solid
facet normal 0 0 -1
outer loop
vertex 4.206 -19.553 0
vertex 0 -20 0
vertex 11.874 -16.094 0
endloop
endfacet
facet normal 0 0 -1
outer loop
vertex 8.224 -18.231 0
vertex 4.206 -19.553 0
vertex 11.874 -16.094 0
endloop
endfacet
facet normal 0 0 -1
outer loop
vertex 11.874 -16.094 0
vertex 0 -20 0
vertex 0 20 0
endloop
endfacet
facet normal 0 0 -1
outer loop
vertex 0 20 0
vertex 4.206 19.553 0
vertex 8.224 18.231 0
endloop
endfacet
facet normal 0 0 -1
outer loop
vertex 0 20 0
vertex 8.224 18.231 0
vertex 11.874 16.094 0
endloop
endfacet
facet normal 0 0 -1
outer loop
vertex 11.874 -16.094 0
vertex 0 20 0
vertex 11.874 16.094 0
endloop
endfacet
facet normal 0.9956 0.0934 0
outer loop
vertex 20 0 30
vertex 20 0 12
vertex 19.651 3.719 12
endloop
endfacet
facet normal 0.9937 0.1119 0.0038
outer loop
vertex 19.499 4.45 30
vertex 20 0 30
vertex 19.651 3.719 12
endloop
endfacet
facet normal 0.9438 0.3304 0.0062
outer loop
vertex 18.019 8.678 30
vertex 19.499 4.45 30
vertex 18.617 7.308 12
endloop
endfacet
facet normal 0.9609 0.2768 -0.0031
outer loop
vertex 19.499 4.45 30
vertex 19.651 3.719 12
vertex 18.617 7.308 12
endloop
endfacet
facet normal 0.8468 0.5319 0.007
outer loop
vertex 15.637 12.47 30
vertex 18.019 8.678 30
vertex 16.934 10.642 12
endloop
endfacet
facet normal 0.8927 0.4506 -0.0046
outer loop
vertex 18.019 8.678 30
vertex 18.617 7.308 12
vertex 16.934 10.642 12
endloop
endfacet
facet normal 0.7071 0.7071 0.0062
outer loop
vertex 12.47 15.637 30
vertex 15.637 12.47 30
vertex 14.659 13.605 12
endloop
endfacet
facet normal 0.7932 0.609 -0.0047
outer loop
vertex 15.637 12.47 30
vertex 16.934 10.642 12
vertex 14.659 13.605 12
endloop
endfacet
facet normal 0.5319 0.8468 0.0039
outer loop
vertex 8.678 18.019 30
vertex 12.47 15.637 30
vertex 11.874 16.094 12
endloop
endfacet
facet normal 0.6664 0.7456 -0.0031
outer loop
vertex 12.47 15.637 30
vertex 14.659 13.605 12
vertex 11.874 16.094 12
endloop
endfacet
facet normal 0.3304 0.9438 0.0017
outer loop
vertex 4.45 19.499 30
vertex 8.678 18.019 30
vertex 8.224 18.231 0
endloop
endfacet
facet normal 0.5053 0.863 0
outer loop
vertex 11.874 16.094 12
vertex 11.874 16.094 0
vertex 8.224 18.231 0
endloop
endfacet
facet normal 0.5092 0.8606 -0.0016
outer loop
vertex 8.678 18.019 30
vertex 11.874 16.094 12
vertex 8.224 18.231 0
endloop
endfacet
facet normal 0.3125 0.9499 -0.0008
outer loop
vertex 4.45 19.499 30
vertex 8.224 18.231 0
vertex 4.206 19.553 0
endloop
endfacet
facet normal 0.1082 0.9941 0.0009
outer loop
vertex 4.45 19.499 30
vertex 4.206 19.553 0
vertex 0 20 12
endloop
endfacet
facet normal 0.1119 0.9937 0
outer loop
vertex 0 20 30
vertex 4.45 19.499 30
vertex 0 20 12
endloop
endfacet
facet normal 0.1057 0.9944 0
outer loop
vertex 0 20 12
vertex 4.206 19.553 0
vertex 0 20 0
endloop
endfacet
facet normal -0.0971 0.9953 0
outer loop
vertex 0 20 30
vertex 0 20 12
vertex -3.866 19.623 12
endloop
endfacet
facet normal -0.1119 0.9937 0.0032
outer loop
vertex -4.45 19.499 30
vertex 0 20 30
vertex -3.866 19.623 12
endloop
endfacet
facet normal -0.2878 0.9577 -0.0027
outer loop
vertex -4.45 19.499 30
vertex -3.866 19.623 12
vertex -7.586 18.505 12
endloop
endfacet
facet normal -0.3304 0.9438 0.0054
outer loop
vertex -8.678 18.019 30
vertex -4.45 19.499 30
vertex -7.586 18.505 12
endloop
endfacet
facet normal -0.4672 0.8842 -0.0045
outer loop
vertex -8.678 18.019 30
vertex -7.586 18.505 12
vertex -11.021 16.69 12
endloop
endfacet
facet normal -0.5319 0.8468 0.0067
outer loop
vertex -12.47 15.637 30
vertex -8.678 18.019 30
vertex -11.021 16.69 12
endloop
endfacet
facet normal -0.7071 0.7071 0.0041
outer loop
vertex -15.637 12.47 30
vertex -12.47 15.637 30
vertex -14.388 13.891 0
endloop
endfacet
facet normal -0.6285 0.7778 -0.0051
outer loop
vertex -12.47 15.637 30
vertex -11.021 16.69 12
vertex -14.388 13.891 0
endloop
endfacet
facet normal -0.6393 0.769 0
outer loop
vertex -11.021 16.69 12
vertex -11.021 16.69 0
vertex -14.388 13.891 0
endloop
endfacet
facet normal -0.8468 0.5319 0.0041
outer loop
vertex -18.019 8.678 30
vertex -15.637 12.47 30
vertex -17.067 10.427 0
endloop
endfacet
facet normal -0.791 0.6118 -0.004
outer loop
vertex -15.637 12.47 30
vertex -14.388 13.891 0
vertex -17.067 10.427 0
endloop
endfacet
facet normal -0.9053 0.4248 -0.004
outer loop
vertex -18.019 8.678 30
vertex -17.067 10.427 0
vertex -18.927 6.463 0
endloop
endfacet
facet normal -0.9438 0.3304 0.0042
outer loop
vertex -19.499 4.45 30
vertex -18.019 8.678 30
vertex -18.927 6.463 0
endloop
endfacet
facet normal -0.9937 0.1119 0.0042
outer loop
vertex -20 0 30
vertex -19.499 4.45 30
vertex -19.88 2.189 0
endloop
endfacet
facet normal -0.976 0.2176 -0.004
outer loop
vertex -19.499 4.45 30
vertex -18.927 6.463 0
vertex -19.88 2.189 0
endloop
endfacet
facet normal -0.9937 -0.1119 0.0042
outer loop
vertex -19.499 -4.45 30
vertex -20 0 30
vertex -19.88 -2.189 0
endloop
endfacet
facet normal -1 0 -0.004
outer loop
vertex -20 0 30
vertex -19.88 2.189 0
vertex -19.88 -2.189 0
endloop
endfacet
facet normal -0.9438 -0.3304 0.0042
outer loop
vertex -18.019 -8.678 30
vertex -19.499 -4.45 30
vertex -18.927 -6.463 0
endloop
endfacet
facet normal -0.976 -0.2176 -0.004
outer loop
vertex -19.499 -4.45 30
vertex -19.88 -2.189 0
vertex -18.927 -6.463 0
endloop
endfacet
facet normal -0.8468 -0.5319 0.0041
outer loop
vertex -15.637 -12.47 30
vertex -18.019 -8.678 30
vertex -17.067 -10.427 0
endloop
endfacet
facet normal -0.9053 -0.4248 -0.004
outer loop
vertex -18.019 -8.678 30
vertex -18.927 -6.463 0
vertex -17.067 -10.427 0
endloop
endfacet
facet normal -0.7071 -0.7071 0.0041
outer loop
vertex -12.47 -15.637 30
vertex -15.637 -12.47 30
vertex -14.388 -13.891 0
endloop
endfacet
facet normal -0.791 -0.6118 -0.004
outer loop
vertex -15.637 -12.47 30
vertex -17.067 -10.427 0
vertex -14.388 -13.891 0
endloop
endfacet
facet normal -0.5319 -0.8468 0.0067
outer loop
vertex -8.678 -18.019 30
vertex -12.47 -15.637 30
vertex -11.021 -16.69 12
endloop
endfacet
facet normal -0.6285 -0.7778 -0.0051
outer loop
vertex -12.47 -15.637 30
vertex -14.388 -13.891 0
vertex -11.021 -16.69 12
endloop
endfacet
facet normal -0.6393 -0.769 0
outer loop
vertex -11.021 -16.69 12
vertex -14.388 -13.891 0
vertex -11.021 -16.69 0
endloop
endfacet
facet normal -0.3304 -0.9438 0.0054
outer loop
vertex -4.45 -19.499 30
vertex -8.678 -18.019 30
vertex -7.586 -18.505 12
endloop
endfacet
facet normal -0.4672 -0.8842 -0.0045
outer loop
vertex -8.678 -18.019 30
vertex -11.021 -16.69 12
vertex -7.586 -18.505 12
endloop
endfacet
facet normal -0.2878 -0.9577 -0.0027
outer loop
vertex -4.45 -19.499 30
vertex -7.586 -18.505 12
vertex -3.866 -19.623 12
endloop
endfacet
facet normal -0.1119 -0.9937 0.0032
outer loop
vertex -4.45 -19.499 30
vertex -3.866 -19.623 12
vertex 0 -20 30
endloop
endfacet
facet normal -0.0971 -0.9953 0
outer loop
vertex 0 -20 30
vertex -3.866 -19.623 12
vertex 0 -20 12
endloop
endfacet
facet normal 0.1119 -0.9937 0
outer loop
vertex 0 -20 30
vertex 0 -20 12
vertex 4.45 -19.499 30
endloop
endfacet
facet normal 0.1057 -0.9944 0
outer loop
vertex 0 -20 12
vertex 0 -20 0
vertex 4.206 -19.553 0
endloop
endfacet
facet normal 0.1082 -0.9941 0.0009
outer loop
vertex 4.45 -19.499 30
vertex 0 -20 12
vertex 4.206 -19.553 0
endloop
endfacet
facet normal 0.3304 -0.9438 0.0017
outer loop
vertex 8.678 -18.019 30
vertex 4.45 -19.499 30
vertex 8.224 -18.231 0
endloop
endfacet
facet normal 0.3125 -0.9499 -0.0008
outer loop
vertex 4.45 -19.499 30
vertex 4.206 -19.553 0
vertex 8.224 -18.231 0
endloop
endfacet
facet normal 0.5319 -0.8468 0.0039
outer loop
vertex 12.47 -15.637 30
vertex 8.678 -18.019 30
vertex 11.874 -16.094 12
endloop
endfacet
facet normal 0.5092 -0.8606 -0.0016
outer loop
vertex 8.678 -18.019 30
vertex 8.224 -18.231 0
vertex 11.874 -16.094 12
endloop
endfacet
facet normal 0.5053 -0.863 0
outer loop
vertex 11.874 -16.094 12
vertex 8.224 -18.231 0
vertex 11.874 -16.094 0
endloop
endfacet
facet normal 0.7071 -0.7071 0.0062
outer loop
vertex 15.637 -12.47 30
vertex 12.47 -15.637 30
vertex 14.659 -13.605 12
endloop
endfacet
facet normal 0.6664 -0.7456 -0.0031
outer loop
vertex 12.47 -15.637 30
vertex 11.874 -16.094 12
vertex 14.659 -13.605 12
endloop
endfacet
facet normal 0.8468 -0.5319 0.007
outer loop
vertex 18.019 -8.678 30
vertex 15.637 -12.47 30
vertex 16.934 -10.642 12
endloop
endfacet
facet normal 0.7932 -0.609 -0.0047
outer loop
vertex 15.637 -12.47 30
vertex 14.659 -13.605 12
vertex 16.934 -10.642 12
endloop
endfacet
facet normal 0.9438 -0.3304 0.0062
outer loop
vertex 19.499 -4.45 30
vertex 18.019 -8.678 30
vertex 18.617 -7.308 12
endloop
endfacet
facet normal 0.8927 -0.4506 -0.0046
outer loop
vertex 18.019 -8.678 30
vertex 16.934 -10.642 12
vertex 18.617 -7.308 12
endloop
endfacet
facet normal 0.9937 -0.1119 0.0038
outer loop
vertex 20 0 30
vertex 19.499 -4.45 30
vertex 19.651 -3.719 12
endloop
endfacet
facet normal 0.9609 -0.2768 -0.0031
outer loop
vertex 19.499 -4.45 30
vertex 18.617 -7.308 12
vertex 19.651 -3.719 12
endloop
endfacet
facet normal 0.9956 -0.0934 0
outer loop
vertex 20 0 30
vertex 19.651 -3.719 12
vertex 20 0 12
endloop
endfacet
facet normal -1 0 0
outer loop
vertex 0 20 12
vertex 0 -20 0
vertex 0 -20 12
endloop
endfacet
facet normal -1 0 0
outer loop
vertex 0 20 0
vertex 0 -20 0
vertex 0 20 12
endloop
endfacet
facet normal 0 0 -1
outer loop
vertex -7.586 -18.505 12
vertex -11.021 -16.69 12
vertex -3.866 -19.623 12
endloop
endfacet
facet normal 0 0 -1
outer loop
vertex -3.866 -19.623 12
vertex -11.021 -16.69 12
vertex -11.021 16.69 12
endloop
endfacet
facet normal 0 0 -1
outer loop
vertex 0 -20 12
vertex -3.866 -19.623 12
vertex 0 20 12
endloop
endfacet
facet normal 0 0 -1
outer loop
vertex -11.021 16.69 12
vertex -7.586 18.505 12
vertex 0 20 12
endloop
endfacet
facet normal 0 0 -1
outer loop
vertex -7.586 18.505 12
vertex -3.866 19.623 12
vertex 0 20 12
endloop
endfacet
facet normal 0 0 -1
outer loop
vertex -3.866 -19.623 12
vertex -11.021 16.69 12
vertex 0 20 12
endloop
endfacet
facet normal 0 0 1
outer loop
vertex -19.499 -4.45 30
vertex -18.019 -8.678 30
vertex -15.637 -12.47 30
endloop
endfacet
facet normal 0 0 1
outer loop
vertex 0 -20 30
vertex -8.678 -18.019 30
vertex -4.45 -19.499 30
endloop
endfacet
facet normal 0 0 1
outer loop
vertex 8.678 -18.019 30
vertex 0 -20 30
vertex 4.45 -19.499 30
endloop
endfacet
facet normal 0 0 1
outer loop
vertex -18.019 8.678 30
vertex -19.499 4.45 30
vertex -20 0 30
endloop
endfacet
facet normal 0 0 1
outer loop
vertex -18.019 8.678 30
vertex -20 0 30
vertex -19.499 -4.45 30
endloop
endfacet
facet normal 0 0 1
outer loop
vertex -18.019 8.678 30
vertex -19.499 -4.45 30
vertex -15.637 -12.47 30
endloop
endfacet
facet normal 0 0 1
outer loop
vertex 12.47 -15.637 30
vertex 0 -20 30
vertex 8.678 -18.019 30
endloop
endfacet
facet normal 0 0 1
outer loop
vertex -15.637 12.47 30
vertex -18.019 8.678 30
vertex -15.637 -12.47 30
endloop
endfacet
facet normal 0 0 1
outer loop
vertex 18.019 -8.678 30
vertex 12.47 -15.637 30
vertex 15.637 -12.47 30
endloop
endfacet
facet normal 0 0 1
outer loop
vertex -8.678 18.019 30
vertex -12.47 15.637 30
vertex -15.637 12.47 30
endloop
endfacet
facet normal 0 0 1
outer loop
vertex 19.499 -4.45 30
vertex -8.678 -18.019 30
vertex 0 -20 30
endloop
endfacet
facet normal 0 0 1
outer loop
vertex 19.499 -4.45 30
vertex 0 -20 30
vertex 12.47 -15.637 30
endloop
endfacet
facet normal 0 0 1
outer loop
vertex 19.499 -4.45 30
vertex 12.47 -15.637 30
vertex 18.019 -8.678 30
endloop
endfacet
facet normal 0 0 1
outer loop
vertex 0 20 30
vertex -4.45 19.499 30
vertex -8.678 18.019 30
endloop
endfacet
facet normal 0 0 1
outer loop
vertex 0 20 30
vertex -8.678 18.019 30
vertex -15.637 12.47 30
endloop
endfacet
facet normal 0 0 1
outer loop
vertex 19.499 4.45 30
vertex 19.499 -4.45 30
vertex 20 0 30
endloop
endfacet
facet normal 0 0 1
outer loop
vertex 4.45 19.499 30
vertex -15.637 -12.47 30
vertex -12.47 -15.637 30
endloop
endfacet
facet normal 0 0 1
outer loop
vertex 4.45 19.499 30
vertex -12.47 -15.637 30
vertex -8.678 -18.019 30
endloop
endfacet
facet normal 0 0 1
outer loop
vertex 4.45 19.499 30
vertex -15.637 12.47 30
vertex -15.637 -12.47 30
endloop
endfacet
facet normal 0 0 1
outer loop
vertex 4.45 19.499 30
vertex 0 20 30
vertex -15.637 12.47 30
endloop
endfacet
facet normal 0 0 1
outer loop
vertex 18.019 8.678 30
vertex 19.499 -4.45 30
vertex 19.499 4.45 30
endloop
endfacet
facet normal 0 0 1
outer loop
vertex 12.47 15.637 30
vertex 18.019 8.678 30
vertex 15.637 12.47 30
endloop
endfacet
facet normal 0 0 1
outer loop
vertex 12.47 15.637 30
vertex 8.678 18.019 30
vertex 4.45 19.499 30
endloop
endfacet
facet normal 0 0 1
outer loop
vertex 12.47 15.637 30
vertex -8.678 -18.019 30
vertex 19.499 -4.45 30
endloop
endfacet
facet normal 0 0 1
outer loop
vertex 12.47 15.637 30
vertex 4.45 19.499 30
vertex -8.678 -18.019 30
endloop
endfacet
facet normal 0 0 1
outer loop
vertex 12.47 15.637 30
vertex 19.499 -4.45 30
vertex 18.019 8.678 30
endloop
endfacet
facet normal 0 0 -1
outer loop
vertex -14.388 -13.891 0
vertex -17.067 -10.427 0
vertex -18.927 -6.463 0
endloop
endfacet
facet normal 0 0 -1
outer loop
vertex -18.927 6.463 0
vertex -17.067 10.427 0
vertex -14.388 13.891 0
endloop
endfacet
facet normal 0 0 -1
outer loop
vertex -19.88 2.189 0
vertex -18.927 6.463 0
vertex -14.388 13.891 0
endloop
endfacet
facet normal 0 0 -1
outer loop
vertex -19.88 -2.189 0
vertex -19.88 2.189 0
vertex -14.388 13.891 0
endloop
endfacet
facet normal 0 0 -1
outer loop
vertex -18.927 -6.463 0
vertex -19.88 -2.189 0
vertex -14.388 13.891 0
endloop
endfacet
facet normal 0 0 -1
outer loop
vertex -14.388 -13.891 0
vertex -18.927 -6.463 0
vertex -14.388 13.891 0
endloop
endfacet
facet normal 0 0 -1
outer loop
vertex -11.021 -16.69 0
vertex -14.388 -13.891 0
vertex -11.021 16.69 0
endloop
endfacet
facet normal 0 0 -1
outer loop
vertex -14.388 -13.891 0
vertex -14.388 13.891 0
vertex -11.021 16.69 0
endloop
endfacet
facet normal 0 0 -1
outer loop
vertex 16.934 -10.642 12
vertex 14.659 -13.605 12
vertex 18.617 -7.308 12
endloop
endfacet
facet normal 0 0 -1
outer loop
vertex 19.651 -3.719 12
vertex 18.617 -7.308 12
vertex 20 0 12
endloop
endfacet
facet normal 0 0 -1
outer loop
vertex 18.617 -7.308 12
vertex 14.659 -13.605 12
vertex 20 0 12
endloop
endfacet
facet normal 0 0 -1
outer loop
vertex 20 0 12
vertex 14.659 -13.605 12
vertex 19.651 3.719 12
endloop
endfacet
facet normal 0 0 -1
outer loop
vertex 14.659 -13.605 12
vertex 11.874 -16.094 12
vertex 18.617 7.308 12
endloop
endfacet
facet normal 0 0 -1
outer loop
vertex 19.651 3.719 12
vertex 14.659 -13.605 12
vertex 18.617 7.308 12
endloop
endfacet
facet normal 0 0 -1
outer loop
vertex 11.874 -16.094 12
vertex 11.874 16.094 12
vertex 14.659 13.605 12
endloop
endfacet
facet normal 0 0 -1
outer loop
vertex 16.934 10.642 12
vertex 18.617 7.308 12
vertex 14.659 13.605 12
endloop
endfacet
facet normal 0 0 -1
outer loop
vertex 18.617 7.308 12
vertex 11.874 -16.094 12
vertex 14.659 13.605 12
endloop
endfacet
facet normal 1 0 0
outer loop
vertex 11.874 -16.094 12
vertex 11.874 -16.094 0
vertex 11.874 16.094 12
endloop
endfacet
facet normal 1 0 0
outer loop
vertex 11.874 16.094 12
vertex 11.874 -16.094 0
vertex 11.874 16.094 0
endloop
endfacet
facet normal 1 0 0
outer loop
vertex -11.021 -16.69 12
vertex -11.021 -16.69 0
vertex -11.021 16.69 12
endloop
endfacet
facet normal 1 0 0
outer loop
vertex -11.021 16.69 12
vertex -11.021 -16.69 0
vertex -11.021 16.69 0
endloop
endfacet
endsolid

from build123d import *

# Parameters (mm, degrees)
F0_R          = 20
F1_DEPTH      = 30
F2_W          = 11.0205635428
F2_H          = 81.4056694508
F3_DEPTH      = 12
F3_DEPTH_BACK = 12
F4_W          = 11.5908719599
F4_H          = 48.789491877
F5_DEPTH      = 12


with BuildPart() as f1:
    # F0 (on Top) → F1 (new body)
    with BuildSketch(Plane.XY):
        Circle(F0_R)
    extrude(amount=F1_DEPTH)

    # F2 (on Top) → F3 (cut, two sides)
    with BuildSketch(Plane.XY) as f3_sk:
        with Locations((-5.5102817714, 0.5468949676)):
            Rectangle(F2_W, F2_H)
    extrude(amount=-F3_DEPTH, mode=Mode.SUBTRACT)
    extrude(f3_sk.sketch, amount=F3_DEPTH_BACK, mode=Mode.SUBTRACT)

    # F4 (on Top) → F5 (cut)
    with BuildSketch(Plane.XY):
        with Locations((17.6695231348, -3.9880210534)):
            Rectangle(F4_W, F4_H)
    extrude(amount=F5_DEPTH, mode=Mode.SUBTRACT)


solid = f1.part
